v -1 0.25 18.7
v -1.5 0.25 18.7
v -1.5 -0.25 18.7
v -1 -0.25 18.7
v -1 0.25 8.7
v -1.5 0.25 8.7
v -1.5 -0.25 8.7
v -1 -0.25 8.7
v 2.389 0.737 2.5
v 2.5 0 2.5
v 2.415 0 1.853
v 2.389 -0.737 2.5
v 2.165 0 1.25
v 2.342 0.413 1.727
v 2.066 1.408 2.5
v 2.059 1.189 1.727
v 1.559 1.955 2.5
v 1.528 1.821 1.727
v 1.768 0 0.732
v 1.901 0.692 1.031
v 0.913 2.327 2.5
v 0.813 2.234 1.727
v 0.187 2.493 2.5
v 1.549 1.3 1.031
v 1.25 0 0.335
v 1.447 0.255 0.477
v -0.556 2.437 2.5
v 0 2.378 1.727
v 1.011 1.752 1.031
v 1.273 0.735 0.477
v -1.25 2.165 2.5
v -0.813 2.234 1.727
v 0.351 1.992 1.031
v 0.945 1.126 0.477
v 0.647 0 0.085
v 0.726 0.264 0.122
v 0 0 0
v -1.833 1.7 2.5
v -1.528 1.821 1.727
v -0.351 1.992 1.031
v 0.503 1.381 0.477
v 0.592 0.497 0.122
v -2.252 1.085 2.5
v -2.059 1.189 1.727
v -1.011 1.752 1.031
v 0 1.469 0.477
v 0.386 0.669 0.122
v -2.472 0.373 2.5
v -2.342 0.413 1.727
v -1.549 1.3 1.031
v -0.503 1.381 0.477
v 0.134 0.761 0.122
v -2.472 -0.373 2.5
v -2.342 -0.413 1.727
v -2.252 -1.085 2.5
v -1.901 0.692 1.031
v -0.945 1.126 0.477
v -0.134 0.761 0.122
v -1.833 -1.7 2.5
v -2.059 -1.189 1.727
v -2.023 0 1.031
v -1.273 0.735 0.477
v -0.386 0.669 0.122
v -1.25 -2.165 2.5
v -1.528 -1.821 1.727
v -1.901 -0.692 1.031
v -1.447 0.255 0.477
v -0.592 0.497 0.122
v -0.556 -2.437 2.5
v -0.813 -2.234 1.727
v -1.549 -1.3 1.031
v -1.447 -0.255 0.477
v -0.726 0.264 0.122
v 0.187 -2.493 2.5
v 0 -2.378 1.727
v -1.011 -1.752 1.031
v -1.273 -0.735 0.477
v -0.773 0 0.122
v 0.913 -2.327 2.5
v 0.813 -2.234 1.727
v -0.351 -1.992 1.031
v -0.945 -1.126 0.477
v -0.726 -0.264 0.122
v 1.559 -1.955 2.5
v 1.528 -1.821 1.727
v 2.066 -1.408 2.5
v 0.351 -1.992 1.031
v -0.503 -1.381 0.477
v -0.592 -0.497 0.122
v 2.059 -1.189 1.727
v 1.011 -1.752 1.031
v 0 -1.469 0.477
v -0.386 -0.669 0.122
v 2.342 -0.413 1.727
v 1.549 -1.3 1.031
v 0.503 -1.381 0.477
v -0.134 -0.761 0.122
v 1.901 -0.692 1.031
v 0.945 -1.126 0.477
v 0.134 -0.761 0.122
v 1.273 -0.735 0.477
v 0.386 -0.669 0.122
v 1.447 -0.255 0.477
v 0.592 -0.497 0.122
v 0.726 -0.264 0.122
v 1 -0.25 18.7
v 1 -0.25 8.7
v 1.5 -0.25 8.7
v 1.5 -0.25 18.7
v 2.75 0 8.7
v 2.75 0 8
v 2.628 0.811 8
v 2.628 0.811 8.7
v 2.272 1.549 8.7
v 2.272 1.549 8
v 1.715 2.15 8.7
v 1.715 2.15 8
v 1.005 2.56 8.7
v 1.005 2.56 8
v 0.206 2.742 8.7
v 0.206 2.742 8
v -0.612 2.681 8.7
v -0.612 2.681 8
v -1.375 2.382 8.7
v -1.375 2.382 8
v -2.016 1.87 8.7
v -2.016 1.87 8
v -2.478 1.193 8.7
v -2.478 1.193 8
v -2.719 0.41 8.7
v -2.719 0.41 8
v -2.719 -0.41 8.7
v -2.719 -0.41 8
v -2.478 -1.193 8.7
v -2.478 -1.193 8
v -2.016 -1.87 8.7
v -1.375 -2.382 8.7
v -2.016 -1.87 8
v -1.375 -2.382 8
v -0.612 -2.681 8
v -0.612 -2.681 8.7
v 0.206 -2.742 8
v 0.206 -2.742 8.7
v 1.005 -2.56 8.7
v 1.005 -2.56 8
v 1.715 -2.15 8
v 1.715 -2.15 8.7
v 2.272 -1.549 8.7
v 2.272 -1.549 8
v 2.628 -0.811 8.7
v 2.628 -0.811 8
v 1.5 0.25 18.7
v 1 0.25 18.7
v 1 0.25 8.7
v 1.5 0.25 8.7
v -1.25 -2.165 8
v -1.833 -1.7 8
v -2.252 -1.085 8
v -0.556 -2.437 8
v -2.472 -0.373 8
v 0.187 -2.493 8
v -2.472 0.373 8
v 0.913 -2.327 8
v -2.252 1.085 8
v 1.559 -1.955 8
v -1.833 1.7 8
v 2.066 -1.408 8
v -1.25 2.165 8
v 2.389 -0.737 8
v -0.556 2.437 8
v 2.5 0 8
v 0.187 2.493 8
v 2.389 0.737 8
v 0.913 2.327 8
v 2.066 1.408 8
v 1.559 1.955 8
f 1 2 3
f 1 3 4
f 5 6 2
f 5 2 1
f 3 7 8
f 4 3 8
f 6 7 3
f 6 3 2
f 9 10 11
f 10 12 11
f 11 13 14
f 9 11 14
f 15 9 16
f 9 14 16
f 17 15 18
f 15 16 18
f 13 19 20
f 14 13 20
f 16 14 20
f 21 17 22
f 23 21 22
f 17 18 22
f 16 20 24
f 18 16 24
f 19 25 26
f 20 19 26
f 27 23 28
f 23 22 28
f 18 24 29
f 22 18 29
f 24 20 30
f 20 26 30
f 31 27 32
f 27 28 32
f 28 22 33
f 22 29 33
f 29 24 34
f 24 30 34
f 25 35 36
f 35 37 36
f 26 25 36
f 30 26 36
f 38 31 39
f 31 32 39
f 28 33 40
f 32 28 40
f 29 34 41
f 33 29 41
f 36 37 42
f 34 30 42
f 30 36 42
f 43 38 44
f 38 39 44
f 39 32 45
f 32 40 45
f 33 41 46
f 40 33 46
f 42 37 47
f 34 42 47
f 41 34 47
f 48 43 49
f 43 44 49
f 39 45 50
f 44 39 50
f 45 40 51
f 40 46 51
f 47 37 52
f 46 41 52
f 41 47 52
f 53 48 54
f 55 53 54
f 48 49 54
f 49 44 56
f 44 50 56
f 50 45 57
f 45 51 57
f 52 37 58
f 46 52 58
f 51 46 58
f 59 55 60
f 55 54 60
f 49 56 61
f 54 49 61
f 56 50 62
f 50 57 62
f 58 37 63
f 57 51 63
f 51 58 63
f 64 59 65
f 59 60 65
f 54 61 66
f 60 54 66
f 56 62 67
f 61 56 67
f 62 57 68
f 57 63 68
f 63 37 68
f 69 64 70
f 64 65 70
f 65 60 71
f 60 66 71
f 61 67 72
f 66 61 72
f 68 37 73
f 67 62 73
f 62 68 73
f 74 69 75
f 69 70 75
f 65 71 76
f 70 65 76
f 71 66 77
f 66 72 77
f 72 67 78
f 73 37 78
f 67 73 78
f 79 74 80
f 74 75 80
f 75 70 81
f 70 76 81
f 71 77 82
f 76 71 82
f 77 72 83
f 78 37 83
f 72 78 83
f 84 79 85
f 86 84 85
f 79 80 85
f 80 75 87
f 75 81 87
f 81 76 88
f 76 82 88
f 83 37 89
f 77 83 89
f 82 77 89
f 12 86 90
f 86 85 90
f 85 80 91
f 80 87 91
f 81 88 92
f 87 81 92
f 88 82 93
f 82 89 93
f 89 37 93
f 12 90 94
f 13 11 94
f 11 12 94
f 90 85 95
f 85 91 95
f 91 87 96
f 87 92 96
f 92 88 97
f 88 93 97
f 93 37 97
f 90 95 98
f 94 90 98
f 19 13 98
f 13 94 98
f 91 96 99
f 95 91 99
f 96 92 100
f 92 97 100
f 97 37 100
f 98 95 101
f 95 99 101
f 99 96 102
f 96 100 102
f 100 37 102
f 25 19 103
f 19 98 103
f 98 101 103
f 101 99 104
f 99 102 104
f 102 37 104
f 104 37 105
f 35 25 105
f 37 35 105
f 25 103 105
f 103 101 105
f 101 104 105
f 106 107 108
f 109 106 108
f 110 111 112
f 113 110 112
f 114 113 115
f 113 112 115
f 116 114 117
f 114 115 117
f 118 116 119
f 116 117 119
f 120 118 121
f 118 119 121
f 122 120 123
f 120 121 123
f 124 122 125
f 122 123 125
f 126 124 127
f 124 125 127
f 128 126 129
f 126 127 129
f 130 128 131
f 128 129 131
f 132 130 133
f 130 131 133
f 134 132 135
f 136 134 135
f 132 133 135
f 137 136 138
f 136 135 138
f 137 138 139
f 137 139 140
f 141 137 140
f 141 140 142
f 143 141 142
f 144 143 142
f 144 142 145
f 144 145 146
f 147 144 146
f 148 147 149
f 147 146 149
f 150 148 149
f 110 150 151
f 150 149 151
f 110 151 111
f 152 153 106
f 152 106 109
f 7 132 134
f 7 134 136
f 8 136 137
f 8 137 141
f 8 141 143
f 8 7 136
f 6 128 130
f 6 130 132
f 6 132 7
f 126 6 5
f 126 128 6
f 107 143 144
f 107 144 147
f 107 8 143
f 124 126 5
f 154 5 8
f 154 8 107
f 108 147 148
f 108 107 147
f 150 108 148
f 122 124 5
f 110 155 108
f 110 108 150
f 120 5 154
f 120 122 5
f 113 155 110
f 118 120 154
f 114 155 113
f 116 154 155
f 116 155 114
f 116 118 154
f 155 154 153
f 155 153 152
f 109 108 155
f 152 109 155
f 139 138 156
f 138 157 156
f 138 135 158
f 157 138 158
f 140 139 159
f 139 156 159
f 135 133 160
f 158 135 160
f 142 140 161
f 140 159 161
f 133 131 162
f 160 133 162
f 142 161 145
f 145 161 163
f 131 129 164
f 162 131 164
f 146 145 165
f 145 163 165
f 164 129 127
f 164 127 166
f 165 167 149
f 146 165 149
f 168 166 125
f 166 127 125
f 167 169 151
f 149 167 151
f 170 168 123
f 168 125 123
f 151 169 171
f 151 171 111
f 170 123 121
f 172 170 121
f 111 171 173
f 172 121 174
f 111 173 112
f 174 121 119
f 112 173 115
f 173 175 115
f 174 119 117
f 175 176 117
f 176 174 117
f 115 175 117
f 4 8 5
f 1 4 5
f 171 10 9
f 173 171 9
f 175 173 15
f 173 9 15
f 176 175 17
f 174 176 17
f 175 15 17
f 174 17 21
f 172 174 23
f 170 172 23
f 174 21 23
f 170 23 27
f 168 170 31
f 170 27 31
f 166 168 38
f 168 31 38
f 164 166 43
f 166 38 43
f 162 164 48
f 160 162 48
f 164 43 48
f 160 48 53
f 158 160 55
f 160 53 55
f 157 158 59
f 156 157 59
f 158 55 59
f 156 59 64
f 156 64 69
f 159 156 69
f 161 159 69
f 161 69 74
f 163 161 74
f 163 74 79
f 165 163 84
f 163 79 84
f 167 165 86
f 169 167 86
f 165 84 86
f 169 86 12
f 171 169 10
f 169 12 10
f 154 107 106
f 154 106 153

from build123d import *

# Parameters (mm, degrees)
ESQUISSE1_R        = 2.5
BOSS_EXTRU_1_DEPTH = 8
ESQUISSE2_R        = 2.75
BOSS_EXTRU_2_DEPTH = 0.7
ESQUISSE3_W        = 0.5
ESQUISSE3_H        = 0.5
BOSS_EXTRU_3_DEPTH = 10
CONG_1_R           = 2.5


with BuildPart() as part:
    # Esquisse1 → Boss.-Extru.1 (new body)
    with BuildSketch(Plane.XY):
        Circle(ESQUISSE1_R)
    extrude(amount=BOSS_EXTRU_1_DEPTH)

    # Esquisse2 → Boss.-Extru.2 (add)
    with BuildSketch(Plane.XY.offset(8)):
        Circle(ESQUISSE2_R)
    extrude(amount=BOSS_EXTRU_2_DEPTH)

    # Esquisse3 → Boss.-Extru.3 (add)
    with BuildSketch(Plane.XY.offset(8.7)):
        with Locations((-1.25, 0)):
            Rectangle(ESQUISSE3_W, ESQUISSE3_H)
        with Locations((1.25, 0)):
            Rectangle(ESQUISSE3_W, ESQUISSE3_H)
    extrude(amount=BOSS_EXTRU_3_DEPTH)

    # Congé1
    cong_1_edges = [part.edges().sort_by_distance(p)[0] for p in [
        (-2.5, 0, 0),
    ]]
    fillet(cong_1_edges, radius=CONG_1_R)


solid = part.part
